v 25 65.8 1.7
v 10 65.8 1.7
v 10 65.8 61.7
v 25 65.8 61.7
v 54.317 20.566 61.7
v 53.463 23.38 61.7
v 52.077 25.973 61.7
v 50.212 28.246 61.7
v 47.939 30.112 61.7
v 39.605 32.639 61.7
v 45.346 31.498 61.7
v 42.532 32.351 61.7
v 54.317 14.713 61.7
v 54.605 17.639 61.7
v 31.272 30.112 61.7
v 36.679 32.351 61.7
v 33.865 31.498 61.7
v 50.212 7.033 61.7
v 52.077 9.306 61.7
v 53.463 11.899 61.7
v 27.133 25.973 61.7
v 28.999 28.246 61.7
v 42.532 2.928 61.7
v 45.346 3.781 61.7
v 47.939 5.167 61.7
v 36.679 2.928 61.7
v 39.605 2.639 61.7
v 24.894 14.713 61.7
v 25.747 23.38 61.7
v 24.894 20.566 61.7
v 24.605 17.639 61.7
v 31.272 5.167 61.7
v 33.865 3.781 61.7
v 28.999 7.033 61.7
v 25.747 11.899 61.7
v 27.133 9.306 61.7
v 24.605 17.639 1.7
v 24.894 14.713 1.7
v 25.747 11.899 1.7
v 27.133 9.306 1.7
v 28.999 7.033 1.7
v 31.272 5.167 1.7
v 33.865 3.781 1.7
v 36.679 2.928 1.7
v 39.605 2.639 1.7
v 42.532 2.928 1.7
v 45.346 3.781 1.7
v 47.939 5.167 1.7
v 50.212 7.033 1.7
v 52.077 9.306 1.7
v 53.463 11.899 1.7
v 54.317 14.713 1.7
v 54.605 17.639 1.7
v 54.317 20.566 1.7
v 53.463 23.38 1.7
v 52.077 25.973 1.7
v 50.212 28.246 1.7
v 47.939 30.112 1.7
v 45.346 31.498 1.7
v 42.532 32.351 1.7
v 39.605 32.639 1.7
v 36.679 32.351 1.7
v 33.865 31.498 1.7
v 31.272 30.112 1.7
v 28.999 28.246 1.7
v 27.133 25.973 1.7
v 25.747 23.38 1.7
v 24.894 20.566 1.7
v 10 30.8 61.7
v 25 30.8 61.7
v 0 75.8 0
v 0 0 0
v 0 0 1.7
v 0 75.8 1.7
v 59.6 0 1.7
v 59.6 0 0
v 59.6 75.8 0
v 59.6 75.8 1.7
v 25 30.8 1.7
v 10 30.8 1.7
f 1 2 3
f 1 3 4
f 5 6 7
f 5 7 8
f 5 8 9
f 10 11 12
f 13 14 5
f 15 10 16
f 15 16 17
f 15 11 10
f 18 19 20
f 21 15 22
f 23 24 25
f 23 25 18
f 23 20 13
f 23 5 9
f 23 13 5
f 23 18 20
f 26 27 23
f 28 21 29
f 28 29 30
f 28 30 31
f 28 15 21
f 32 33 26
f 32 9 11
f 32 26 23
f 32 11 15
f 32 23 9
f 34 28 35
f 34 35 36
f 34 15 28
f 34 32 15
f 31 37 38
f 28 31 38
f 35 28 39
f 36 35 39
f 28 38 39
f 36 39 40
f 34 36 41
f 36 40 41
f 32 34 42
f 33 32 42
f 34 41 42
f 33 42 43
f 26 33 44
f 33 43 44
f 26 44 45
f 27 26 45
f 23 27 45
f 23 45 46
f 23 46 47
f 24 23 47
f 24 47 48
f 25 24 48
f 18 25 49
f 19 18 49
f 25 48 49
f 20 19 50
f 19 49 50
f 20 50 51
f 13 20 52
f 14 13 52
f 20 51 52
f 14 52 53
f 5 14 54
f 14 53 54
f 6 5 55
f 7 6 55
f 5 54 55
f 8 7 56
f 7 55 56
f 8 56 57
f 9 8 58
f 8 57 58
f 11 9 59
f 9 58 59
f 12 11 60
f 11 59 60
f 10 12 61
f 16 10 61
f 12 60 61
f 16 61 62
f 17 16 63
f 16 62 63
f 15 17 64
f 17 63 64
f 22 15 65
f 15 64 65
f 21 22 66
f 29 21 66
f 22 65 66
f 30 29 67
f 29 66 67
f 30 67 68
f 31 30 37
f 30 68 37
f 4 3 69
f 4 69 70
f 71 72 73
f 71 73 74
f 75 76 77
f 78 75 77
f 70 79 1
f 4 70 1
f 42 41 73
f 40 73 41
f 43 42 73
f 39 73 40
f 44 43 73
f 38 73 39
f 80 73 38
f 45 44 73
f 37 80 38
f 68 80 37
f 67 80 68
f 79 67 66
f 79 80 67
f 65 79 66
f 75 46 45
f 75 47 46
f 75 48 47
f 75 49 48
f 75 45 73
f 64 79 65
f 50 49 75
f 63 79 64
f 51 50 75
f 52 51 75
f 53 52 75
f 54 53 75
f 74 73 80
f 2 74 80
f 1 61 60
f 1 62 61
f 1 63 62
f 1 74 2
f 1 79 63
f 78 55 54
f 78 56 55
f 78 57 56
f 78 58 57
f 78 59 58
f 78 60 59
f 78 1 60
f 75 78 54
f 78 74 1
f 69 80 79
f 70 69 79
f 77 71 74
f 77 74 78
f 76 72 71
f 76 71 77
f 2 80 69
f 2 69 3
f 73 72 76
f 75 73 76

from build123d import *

# Parameters (mm, degrees)
ESBO_O1_W                = 59.6
ESBO_O1_H                = 75.8
RESSALTO_EXTRUS_O1_DEPTH = 1.7
ESBO_O2_W                = 15
ESBO_O2_H                = 35
RESSALTO_EXTRUS_O2_DEPTH = 60
ESBO_O5_R                = 15
RESSALTO_EXTRUS_O4_DEPTH = 60


with BuildPart() as part:
    # Esboço1 → Ressalto-extrusão1 (new body)
    with BuildSketch(Plane.XY):
        with Locations((29.8, 37.9)):
            Rectangle(ESBO_O1_W, ESBO_O1_H)
    extrude(amount=RESSALTO_EXTRUS_O1_DEPTH)

    # Esboço2 → Ressalto-extrusão2 (add)
    with BuildSketch(Plane.XY.offset(1.7)):
        with Locations((17.5, 48.3)):
            Rectangle(ESBO_O2_W, ESBO_O2_H)
    extrude(amount=RESSALTO_EXTRUS_O2_DEPTH)

    # Esboço5 → Ressalto-extrusão4 (add)
    with BuildSketch(Plane.XY.offset(1.7)):
        with Locations(Location((39.605292245, 17.63947517, 0), (0, 0, 180))):
            Circle(ESBO_O5_R)
    extrude(amount=RESSALTO_EXTRUS_O4_DEPTH)


solid = part.part
